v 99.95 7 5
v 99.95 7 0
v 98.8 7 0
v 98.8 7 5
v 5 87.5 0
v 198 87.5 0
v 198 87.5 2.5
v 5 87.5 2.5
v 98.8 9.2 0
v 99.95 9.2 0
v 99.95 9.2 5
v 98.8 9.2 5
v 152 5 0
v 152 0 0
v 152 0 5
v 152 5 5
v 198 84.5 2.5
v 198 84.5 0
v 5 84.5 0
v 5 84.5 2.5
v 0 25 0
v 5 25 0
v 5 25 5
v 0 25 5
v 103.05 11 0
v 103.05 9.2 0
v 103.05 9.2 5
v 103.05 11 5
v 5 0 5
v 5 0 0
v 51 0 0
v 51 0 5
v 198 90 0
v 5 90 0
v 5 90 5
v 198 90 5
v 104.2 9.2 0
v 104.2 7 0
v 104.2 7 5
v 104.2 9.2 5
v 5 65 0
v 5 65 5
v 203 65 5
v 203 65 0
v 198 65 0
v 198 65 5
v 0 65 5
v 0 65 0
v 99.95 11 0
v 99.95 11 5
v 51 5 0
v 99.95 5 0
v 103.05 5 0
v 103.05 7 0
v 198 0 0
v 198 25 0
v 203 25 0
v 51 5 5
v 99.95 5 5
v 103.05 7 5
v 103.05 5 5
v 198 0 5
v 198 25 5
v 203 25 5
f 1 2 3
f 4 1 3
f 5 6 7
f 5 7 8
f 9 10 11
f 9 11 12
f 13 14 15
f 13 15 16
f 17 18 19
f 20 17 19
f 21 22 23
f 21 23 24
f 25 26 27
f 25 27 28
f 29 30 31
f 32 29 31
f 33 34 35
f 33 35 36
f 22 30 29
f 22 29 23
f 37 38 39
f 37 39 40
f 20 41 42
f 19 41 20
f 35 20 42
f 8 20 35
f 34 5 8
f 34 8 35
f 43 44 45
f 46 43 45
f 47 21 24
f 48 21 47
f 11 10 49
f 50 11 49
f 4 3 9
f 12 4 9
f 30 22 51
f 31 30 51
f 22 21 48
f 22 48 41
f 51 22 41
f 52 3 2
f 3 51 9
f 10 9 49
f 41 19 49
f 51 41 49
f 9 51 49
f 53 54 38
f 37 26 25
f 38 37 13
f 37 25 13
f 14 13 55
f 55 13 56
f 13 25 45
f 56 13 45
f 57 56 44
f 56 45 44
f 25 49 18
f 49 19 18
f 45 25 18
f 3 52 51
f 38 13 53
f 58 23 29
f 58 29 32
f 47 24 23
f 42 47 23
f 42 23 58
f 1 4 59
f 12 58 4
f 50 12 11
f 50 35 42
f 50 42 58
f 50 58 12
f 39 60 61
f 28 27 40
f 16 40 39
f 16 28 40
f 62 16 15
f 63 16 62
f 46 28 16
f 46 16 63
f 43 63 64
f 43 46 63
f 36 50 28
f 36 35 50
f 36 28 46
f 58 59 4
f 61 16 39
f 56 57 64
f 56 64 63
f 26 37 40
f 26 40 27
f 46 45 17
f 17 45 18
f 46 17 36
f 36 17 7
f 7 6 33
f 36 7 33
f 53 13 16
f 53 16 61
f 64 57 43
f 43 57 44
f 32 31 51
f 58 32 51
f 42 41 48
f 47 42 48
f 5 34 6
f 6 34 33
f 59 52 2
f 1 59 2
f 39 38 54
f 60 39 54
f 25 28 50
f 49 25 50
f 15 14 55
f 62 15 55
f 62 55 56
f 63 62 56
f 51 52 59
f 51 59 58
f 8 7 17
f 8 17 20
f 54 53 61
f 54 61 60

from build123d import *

# Parameters (mm, degrees)
SKETCH1_W           = 203
SKETCH1_H           = 90
BOSS_EXTRUDE1_DEPTH = 5
SKETCH3_W           = 5
SKETCH3_H           = 25
SKETCH3_W_2         = 101
SKETCH3_H_2         = 5
CUT_EXTRUDE2_DEPTH  = 223.112584065
SKETCH4_W           = 193
SKETCH4_H           = 3
CUT_EXTRUDE3_DEPTH  = 2.5
SKETCH5_W           = 3.1
SKETCH5_H           = 1.8
SKETCH5_W_2         = 1.15
SKETCH5_H_2         = 2.2
SKETCH5_H_3         = 2
CUT_EXTRUDE4_DEPTH  = 223.112584065


with BuildPart() as part:
    # Sketch1 → Boss-Extrude1 (new body)
    with BuildSketch(Plane.XY):
        with Locations((101.5, 45)):
            Rectangle(SKETCH1_W, SKETCH1_H)
    extrude(amount=BOSS_EXTRUDE1_DEPTH)

    # Sketch3 → Cut-Extrude2 (cut, through all)
    with BuildSketch(Plane(origin=(0, 0, 0), x_dir=(-1, 0, 0), z_dir=(0, 0, -1))):
        with Locations((-200.5, 12.5)):
            Rectangle(SKETCH3_W, SKETCH3_H)
        with Locations((-200.5, 77.5)):
            Rectangle(SKETCH3_W, SKETCH3_H)
        with Locations((-2.5, 12.5)):
            Rectangle(SKETCH3_W, SKETCH3_H)
        with Locations((-2.5, 77.5)):
            Rectangle(SKETCH3_W, SKETCH3_H)
        with Locations((-101.5, 2.5)):
            Rectangle(SKETCH3_W_2, SKETCH3_H_2)
    extrude(amount=-CUT_EXTRUDE2_DEPTH, mode=Mode.SUBTRACT)

    # Sketch4 → Cut-Extrude3 (cut)
    with BuildSketch(Plane(origin=(0, 0, 0), x_dir=(-1, 0, 0), z_dir=(0, 0, -1))):
        with Locations((-101.5, 86)):
            Rectangle(SKETCH4_W, SKETCH4_H)
    extrude(amount=-CUT_EXTRUDE3_DEPTH, mode=Mode.SUBTRACT)

    # Sketch5 → Cut-Extrude4 (cut, through all)
    with BuildSketch(Plane(origin=(0, 0, 0), x_dir=(-1, 0, 0), z_dir=(0, 0, -1))):
        with Locations((-101.5, 10.1)):
            Rectangle(SKETCH5_W, SKETCH5_H)
        with Locations((-103.625, 8.1)):
            Rectangle(SKETCH5_W_2, SKETCH5_H_2)
        with Locations((-101.5, 8.1)):
            Rectangle(SKETCH5_W, SKETCH5_H_2)
        with Locations((-99.375, 8.1)):
            Rectangle(SKETCH5_W_2, SKETCH5_H_2)
        with Locations((-101.5, 6)):
            Rectangle(SKETCH5_W, SKETCH5_H_3)
    extrude(amount=-CUT_EXTRUDE4_DEPTH, mode=Mode.SUBTRACT)


solid = part.part
